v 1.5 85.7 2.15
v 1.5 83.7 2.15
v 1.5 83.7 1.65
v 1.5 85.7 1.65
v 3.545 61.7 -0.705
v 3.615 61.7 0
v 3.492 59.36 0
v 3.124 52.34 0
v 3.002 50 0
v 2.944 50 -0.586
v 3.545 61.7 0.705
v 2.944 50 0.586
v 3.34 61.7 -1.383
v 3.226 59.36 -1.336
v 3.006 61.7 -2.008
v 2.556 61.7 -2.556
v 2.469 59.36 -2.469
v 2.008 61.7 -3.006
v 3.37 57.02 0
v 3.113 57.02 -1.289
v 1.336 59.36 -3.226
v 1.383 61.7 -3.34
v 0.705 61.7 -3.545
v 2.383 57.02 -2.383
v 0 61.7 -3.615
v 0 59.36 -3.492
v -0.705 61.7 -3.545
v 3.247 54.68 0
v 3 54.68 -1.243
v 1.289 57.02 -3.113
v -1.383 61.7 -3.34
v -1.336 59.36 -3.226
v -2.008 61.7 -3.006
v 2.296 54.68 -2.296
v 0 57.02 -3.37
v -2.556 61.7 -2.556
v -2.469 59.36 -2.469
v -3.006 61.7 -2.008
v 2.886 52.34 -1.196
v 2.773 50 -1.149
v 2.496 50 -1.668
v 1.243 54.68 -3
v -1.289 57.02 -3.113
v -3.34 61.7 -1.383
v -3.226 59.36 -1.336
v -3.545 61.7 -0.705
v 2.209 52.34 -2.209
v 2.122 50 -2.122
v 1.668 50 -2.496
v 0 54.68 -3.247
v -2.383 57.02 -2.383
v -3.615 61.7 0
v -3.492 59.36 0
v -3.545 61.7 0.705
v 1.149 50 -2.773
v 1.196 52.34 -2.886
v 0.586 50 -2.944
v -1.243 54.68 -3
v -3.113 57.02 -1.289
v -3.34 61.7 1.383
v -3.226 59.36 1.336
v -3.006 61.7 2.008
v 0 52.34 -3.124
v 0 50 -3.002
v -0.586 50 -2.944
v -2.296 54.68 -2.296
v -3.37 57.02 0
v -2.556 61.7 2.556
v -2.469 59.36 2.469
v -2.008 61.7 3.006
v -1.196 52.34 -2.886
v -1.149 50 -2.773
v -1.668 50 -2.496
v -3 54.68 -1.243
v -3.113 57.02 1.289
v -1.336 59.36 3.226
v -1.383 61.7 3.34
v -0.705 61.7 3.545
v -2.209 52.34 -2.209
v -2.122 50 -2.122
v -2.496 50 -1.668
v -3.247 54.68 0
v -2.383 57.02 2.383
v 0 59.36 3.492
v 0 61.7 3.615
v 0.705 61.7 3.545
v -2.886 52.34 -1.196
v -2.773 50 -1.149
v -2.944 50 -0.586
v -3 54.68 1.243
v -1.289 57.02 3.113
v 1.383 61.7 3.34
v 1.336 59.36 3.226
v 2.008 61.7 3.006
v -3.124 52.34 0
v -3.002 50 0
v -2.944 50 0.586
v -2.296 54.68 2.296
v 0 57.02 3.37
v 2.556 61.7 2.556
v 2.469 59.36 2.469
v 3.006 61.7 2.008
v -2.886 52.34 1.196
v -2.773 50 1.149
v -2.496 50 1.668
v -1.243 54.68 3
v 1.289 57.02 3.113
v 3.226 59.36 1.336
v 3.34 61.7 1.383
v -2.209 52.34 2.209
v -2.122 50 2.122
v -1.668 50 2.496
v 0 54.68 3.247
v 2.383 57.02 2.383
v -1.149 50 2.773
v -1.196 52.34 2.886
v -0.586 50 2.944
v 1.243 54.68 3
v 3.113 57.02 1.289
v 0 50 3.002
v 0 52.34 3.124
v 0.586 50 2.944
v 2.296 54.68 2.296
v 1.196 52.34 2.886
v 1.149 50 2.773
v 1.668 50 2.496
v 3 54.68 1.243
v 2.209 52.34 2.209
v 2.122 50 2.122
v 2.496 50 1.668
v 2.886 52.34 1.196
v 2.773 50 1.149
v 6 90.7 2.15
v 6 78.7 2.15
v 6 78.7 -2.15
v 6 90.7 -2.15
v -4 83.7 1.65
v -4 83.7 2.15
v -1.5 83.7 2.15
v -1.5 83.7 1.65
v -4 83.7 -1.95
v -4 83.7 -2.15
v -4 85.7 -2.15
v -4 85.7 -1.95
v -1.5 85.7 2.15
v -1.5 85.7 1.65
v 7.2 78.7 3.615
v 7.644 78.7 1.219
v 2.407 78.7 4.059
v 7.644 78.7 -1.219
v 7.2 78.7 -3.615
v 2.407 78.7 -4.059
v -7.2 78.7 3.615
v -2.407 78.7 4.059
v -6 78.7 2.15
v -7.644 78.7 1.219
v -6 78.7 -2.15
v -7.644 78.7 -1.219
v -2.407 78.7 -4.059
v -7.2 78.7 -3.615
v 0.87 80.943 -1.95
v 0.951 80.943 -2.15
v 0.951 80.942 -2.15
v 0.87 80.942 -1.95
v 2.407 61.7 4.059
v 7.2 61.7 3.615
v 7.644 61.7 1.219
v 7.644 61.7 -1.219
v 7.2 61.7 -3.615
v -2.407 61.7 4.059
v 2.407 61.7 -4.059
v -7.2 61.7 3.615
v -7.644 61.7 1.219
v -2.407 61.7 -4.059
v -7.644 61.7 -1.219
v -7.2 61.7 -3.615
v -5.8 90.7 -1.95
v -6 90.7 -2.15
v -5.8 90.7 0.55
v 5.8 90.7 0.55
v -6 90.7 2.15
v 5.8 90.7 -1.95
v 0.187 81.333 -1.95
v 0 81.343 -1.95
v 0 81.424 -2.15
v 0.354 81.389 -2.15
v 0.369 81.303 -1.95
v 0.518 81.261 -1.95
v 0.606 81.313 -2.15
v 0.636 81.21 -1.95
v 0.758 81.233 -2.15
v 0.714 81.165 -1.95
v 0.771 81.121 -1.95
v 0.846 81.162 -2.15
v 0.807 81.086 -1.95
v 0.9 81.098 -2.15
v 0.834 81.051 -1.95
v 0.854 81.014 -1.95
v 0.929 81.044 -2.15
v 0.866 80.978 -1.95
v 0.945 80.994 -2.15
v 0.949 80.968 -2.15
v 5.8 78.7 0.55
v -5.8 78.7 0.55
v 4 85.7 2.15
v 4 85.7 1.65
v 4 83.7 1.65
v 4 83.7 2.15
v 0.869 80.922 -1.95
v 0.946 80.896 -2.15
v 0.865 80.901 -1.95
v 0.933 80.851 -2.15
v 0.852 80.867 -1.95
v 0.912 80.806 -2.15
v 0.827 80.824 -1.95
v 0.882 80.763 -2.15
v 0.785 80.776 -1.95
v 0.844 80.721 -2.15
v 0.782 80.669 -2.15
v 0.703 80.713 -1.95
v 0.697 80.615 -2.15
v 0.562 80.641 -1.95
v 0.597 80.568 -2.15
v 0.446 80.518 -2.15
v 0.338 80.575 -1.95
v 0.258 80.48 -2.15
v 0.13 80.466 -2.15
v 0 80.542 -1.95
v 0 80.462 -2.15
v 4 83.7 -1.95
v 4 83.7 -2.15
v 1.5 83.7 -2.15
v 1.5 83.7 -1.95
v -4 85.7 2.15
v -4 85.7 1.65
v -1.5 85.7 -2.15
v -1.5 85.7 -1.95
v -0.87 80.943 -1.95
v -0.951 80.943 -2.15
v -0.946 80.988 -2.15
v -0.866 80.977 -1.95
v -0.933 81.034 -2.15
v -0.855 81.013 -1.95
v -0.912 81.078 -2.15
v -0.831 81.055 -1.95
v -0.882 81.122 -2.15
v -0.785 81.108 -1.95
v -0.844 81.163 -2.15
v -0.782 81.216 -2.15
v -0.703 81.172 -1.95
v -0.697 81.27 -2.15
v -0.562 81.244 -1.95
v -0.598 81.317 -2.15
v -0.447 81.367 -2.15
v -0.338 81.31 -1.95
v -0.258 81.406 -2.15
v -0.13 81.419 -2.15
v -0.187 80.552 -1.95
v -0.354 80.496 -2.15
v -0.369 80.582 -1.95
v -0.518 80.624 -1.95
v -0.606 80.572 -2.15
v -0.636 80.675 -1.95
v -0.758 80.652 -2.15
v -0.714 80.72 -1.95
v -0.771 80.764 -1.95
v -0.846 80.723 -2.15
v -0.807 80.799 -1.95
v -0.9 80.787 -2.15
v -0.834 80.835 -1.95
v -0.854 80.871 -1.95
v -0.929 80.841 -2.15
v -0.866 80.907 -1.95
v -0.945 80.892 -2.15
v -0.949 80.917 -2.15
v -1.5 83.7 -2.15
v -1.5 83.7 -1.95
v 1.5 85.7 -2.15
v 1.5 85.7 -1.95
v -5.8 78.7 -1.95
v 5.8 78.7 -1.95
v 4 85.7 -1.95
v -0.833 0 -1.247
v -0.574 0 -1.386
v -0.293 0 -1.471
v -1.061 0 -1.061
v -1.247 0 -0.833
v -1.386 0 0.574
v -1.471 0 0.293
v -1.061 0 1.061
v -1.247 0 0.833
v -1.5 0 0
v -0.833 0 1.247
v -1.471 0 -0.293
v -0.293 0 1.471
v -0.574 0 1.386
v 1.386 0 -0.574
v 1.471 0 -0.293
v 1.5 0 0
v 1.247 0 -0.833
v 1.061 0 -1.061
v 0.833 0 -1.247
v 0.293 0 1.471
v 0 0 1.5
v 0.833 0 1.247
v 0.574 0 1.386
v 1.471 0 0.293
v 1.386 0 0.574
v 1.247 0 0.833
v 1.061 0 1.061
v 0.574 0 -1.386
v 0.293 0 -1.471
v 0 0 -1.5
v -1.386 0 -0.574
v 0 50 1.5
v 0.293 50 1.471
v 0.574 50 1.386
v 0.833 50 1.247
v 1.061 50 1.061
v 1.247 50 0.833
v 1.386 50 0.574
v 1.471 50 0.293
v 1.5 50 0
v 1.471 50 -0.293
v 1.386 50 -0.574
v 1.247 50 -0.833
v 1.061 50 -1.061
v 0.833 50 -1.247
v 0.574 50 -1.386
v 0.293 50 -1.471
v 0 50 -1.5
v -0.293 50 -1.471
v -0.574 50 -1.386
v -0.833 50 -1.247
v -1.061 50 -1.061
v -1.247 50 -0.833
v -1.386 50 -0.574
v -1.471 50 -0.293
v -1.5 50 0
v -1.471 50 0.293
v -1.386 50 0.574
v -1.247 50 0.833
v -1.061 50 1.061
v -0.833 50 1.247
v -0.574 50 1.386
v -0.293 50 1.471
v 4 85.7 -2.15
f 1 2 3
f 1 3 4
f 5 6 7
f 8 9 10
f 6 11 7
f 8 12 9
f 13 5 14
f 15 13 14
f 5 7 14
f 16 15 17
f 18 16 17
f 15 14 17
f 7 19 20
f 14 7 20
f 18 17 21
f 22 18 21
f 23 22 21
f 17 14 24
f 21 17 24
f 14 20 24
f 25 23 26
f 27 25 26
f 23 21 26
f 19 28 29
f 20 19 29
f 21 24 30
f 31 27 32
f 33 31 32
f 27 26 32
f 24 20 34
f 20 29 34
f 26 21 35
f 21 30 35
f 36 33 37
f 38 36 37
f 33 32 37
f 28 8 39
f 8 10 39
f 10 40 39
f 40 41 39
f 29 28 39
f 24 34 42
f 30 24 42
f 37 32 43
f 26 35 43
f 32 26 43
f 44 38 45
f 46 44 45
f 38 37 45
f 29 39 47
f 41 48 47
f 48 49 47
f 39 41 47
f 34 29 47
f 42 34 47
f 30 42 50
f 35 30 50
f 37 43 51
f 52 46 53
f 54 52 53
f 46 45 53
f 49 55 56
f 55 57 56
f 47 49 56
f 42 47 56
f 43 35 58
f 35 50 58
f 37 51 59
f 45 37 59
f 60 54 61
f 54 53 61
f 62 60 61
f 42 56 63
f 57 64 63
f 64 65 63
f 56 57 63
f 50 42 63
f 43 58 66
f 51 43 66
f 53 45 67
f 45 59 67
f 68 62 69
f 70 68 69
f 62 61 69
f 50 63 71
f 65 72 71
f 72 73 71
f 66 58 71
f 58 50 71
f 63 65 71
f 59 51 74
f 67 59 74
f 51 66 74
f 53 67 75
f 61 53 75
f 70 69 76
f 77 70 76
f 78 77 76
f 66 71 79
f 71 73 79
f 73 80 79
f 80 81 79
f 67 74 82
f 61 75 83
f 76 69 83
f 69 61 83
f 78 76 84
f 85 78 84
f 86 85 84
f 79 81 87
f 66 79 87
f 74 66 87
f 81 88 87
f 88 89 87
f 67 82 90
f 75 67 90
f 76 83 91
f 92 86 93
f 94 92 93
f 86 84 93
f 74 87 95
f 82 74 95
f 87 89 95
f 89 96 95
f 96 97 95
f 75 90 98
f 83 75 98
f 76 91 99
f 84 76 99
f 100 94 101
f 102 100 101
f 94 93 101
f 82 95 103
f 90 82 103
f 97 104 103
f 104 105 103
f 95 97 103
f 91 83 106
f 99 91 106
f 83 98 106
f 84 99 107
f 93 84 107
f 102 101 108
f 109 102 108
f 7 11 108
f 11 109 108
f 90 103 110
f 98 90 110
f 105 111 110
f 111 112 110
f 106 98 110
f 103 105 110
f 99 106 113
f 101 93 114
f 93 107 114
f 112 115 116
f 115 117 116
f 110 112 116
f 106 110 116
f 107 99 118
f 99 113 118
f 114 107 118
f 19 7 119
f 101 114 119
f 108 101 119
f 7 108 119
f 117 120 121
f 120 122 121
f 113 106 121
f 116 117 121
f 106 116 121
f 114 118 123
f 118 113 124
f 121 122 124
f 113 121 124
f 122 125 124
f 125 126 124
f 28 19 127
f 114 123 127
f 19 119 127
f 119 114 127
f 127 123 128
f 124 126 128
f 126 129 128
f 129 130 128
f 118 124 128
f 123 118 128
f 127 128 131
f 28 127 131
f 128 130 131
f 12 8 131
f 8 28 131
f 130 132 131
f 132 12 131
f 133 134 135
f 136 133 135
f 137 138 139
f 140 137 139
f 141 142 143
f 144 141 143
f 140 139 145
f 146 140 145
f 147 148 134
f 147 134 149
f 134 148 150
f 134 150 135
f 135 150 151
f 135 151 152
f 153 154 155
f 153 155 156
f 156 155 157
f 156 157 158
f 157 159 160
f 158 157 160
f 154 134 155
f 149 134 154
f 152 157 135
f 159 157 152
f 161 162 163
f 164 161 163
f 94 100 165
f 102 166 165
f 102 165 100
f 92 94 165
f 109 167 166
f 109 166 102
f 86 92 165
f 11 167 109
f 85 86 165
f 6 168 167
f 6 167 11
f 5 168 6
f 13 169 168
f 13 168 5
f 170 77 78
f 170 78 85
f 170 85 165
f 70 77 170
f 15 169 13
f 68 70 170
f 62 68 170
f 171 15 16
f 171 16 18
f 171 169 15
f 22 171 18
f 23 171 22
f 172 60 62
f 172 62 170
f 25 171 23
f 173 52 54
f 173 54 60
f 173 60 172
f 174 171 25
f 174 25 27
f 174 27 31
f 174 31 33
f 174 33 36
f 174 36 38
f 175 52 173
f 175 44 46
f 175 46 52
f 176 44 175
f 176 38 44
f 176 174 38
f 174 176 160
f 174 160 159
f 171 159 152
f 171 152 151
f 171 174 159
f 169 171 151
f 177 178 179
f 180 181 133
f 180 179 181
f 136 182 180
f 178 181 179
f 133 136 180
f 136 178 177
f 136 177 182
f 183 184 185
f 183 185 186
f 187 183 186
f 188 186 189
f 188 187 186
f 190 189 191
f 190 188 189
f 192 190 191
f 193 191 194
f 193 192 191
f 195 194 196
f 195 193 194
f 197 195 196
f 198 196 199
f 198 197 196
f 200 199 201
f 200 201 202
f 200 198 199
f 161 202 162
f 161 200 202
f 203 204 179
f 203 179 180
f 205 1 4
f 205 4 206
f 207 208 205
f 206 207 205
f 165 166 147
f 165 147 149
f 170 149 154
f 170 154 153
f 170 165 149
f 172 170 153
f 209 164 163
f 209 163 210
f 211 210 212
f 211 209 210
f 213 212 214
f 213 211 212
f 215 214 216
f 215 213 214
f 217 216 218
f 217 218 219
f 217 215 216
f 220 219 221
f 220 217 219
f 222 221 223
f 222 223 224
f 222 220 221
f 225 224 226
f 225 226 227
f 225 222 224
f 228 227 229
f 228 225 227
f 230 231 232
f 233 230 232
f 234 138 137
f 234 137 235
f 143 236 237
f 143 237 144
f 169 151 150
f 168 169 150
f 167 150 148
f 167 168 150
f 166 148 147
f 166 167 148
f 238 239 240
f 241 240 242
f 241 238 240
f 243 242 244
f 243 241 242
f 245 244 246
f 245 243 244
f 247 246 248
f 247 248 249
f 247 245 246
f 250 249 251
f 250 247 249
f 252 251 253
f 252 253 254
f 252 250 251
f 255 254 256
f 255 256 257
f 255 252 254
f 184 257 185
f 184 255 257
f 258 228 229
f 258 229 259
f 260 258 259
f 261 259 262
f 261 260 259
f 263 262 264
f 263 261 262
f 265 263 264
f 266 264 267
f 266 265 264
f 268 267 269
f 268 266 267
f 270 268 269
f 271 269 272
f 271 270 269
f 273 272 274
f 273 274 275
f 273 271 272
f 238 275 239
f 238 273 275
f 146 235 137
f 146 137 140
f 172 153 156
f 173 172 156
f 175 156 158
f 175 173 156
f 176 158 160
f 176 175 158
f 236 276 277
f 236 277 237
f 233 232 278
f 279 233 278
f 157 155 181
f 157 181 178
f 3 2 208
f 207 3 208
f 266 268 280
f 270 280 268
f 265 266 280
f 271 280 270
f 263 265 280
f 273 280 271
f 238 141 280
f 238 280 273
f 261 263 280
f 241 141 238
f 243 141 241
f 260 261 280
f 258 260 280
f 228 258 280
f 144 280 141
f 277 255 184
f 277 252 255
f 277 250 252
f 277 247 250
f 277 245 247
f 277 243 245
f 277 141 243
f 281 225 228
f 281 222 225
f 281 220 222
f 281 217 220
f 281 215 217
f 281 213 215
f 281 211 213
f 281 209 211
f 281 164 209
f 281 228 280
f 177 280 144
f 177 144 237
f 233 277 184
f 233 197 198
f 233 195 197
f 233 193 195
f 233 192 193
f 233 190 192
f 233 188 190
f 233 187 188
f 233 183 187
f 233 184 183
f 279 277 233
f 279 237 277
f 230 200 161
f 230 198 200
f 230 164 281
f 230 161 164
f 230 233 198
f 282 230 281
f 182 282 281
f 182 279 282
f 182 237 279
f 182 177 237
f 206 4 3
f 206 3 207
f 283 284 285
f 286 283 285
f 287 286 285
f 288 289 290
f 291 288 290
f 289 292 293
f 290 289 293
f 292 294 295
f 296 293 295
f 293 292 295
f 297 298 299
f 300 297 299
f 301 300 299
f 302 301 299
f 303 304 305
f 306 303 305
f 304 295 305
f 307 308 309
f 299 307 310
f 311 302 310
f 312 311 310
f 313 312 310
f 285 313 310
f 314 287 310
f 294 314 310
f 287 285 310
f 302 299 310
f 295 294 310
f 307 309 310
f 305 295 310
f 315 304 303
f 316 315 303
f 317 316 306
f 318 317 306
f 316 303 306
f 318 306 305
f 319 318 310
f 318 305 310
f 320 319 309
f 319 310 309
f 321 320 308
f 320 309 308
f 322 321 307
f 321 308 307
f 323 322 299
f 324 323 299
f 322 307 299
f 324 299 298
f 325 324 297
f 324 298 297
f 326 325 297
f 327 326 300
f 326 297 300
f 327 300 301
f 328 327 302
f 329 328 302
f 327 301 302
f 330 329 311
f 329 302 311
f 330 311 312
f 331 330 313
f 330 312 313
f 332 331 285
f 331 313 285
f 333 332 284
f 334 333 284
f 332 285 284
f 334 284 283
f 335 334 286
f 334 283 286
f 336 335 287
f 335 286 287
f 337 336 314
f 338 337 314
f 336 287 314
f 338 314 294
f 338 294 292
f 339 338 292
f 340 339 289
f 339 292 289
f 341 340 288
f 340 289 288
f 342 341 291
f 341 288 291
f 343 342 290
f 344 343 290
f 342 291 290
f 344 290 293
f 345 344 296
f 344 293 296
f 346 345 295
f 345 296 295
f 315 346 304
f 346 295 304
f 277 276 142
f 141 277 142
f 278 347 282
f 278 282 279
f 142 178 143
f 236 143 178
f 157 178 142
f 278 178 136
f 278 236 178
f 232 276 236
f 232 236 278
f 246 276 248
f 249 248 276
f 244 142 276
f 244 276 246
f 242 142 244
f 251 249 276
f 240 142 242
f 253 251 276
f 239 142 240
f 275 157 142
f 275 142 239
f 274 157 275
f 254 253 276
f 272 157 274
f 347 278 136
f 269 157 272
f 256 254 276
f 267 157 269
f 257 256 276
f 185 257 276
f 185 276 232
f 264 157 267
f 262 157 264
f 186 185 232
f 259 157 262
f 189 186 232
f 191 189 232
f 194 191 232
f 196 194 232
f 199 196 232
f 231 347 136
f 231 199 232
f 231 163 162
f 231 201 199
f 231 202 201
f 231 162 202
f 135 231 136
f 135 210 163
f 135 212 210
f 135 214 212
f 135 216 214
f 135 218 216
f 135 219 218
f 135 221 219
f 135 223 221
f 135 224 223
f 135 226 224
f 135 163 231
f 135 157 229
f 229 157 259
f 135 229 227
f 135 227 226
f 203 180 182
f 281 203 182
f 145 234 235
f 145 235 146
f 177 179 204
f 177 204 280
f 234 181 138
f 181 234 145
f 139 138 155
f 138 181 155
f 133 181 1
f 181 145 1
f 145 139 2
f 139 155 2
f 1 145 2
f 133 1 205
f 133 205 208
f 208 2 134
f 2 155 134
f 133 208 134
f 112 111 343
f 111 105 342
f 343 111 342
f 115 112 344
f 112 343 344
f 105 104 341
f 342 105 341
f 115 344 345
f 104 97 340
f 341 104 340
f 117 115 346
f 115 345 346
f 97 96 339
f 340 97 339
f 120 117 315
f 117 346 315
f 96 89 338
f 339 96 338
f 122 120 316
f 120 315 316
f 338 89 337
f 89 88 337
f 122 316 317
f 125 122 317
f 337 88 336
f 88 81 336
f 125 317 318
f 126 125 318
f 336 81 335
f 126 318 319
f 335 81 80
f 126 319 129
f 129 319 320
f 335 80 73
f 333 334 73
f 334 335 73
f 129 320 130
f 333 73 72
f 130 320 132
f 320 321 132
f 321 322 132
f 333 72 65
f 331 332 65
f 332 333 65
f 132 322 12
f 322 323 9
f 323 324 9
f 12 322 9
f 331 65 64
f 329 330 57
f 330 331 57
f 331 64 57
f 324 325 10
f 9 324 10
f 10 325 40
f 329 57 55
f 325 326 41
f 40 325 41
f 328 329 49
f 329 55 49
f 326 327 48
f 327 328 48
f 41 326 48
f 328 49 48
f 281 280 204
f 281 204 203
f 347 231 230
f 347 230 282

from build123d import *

# Parameters (mm, degrees)
SKETCH1_R           = 1.5
BOSS_EXTRUDE1_DEPTH = 50
SKETCH2_R           = 3.001667429
BOSS_EXTRUDE2_DEPTH = 11.7
BOSS_EXTRUDE2_DRAFT = -3
BOSS_EXTRUDE3_DEPTH = 17
SKETCH10_W          = 12
SKETCH10_H          = 4.3
BOSS_EXTRUDE4_DEPTH = 12
SKETCH11_W          = 11.6
SKETCH11_H          = 2.5
CUT_EXTRUDE1_DEPTH  = 12
SKETCH12_W          = 2.5
SKETCH12_H          = 2
CUT_EXTRUDE2_DEPTH  = 0.5
SKETCH14_W          = 2.5
SKETCH14_H          = 2
CUT_EXTRUDE4_DEPTH  = 0.5
SKETCH16_RX         = 0.950654257
SKETCH16_RY         = 0.480988828
CUT_EXTRUDE5_DEPTH  = 0.5
CUT_EXTRUDE5_TAPER  = 22


with BuildPart() as part:
    # Sketch1 → Boss-Extrude1 (new body)
    with BuildSketch(Plane(origin=(0, 0, 0), x_dir=(1, 0, 0), z_dir=(0, 1, 0))):
        with Locations(Location((0, 0, 0), (0, 0, 270))):
            Circle(SKETCH1_R)
    extrude(amount=BOSS_EXTRUDE1_DEPTH)


with BuildPart() as boss_extrude2_tool:
    # Sketch2 → Boss-Extrude2 (with draft: the straight prism first)
    with BuildSketch(Plane(origin=(0, 50, 0), x_dir=(1, 0, 0), z_dir=(0, 1, 0))):
        Circle(SKETCH2_R)
    extrude(amount=BOSS_EXTRUDE2_DEPTH)
    # Boss-Extrude2: the draft: its side faces are tilted about the plane it starts from
    boss_extrude2_sides = [boss_extrude2_tool.faces().sort_by_distance(p)[0] for p in [
        (-3.001667429, 55.85, 0),
    ]]
    draft(boss_extrude2_sides, Plane(origin=(0, 50, 0), x_dir=(1, 0, 0), z_dir=(0, 1, 0)), BOSS_EXTRUDE2_DRAFT)


with BuildPart() as part_1:
    add(part.part)

    # Boss-Extrude2: add boss_extrude2_tool
    add(boss_extrude2_tool.part)

    # Sketch9 → Boss-Extrude3 (add)
    with BuildSketch(Plane(origin=(0, 61.7, 0), x_dir=(1, 0, 0), z_dir=(0, 1, 0))):
        with BuildLine():
            ThreePointArc((-7.2, 3.614838447), (0, 4.114838447), (7.2, 3.614838447))
            ThreePointArc((7.2, 3.614838447), (7.7, 0), (7.2, -3.614838447))
            ThreePointArc((7.2, -3.614838447), (0, -4.114838447), (-7.2, -3.614838447))
            ThreePointArc((-7.2, -3.614838447), (-7.7, 0), (-7.2, 3.614838447))
        make_face()
    extrude(amount=BOSS_EXTRUDE3_DEPTH)

    # Sketch10 → Boss-Extrude4 (add)
    with BuildSketch(Plane(origin=(0, 78.7, 0), x_dir=(1, 0, 0), z_dir=(0, 1, 0))):
        Rectangle(SKETCH10_W, SKETCH10_H)
    extrude(amount=BOSS_EXTRUDE4_DEPTH)

    # Sketch11 → Cut-Extrude1 (cut)
    with BuildSketch(Plane(origin=(0, 90.7, 0), x_dir=(1, 0, 0), z_dir=(0, 1, 0))):
        with Locations((0, 0.7)):
            Rectangle(SKETCH11_W, SKETCH11_H)
    extrude(amount=-CUT_EXTRUDE1_DEPTH, mode=Mode.SUBTRACT)

    # Sketch12 → Cut-Extrude2 (cut)
    with BuildSketch(Plane.XY.offset(2.15)):
        with Locations((-2.75, 84.7)):
            Rectangle(SKETCH12_W, SKETCH12_H)
        with Locations((2.75, 84.7)):
            Rectangle(SKETCH12_W, SKETCH12_H)
    extrude(amount=-CUT_EXTRUDE2_DEPTH, mode=Mode.SUBTRACT)

    # Sketch14 → Cut-Extrude4 (cut)
    with BuildSketch(Plane(origin=(0, 0, -2.15), x_dir=(-1, 0, 0), z_dir=(0, 0, -1))):
        with Locations((-2.75, 84.7)):
            Rectangle(SKETCH14_W, SKETCH14_H)
        with Locations((2.75, 84.7)):
            Rectangle(SKETCH14_W, SKETCH14_H)
    extrude(amount=-CUT_EXTRUDE4_DEPTH, mode=Mode.SUBTRACT)

    # Sketch16 → Cut-Extrude5 (cut)
    with BuildSketch(Plane(origin=(0, 0, -2.15), x_dir=(-1, 0, 0), z_dir=(0, 0, -1))):
        with Locations((0, 80.942553869)):
            Ellipse(SKETCH16_RX, SKETCH16_RY)
    extrude(amount=-CUT_EXTRUDE5_DEPTH, taper=CUT_EXTRUDE5_TAPER, mode=Mode.SUBTRACT)


solid = part_1.part
